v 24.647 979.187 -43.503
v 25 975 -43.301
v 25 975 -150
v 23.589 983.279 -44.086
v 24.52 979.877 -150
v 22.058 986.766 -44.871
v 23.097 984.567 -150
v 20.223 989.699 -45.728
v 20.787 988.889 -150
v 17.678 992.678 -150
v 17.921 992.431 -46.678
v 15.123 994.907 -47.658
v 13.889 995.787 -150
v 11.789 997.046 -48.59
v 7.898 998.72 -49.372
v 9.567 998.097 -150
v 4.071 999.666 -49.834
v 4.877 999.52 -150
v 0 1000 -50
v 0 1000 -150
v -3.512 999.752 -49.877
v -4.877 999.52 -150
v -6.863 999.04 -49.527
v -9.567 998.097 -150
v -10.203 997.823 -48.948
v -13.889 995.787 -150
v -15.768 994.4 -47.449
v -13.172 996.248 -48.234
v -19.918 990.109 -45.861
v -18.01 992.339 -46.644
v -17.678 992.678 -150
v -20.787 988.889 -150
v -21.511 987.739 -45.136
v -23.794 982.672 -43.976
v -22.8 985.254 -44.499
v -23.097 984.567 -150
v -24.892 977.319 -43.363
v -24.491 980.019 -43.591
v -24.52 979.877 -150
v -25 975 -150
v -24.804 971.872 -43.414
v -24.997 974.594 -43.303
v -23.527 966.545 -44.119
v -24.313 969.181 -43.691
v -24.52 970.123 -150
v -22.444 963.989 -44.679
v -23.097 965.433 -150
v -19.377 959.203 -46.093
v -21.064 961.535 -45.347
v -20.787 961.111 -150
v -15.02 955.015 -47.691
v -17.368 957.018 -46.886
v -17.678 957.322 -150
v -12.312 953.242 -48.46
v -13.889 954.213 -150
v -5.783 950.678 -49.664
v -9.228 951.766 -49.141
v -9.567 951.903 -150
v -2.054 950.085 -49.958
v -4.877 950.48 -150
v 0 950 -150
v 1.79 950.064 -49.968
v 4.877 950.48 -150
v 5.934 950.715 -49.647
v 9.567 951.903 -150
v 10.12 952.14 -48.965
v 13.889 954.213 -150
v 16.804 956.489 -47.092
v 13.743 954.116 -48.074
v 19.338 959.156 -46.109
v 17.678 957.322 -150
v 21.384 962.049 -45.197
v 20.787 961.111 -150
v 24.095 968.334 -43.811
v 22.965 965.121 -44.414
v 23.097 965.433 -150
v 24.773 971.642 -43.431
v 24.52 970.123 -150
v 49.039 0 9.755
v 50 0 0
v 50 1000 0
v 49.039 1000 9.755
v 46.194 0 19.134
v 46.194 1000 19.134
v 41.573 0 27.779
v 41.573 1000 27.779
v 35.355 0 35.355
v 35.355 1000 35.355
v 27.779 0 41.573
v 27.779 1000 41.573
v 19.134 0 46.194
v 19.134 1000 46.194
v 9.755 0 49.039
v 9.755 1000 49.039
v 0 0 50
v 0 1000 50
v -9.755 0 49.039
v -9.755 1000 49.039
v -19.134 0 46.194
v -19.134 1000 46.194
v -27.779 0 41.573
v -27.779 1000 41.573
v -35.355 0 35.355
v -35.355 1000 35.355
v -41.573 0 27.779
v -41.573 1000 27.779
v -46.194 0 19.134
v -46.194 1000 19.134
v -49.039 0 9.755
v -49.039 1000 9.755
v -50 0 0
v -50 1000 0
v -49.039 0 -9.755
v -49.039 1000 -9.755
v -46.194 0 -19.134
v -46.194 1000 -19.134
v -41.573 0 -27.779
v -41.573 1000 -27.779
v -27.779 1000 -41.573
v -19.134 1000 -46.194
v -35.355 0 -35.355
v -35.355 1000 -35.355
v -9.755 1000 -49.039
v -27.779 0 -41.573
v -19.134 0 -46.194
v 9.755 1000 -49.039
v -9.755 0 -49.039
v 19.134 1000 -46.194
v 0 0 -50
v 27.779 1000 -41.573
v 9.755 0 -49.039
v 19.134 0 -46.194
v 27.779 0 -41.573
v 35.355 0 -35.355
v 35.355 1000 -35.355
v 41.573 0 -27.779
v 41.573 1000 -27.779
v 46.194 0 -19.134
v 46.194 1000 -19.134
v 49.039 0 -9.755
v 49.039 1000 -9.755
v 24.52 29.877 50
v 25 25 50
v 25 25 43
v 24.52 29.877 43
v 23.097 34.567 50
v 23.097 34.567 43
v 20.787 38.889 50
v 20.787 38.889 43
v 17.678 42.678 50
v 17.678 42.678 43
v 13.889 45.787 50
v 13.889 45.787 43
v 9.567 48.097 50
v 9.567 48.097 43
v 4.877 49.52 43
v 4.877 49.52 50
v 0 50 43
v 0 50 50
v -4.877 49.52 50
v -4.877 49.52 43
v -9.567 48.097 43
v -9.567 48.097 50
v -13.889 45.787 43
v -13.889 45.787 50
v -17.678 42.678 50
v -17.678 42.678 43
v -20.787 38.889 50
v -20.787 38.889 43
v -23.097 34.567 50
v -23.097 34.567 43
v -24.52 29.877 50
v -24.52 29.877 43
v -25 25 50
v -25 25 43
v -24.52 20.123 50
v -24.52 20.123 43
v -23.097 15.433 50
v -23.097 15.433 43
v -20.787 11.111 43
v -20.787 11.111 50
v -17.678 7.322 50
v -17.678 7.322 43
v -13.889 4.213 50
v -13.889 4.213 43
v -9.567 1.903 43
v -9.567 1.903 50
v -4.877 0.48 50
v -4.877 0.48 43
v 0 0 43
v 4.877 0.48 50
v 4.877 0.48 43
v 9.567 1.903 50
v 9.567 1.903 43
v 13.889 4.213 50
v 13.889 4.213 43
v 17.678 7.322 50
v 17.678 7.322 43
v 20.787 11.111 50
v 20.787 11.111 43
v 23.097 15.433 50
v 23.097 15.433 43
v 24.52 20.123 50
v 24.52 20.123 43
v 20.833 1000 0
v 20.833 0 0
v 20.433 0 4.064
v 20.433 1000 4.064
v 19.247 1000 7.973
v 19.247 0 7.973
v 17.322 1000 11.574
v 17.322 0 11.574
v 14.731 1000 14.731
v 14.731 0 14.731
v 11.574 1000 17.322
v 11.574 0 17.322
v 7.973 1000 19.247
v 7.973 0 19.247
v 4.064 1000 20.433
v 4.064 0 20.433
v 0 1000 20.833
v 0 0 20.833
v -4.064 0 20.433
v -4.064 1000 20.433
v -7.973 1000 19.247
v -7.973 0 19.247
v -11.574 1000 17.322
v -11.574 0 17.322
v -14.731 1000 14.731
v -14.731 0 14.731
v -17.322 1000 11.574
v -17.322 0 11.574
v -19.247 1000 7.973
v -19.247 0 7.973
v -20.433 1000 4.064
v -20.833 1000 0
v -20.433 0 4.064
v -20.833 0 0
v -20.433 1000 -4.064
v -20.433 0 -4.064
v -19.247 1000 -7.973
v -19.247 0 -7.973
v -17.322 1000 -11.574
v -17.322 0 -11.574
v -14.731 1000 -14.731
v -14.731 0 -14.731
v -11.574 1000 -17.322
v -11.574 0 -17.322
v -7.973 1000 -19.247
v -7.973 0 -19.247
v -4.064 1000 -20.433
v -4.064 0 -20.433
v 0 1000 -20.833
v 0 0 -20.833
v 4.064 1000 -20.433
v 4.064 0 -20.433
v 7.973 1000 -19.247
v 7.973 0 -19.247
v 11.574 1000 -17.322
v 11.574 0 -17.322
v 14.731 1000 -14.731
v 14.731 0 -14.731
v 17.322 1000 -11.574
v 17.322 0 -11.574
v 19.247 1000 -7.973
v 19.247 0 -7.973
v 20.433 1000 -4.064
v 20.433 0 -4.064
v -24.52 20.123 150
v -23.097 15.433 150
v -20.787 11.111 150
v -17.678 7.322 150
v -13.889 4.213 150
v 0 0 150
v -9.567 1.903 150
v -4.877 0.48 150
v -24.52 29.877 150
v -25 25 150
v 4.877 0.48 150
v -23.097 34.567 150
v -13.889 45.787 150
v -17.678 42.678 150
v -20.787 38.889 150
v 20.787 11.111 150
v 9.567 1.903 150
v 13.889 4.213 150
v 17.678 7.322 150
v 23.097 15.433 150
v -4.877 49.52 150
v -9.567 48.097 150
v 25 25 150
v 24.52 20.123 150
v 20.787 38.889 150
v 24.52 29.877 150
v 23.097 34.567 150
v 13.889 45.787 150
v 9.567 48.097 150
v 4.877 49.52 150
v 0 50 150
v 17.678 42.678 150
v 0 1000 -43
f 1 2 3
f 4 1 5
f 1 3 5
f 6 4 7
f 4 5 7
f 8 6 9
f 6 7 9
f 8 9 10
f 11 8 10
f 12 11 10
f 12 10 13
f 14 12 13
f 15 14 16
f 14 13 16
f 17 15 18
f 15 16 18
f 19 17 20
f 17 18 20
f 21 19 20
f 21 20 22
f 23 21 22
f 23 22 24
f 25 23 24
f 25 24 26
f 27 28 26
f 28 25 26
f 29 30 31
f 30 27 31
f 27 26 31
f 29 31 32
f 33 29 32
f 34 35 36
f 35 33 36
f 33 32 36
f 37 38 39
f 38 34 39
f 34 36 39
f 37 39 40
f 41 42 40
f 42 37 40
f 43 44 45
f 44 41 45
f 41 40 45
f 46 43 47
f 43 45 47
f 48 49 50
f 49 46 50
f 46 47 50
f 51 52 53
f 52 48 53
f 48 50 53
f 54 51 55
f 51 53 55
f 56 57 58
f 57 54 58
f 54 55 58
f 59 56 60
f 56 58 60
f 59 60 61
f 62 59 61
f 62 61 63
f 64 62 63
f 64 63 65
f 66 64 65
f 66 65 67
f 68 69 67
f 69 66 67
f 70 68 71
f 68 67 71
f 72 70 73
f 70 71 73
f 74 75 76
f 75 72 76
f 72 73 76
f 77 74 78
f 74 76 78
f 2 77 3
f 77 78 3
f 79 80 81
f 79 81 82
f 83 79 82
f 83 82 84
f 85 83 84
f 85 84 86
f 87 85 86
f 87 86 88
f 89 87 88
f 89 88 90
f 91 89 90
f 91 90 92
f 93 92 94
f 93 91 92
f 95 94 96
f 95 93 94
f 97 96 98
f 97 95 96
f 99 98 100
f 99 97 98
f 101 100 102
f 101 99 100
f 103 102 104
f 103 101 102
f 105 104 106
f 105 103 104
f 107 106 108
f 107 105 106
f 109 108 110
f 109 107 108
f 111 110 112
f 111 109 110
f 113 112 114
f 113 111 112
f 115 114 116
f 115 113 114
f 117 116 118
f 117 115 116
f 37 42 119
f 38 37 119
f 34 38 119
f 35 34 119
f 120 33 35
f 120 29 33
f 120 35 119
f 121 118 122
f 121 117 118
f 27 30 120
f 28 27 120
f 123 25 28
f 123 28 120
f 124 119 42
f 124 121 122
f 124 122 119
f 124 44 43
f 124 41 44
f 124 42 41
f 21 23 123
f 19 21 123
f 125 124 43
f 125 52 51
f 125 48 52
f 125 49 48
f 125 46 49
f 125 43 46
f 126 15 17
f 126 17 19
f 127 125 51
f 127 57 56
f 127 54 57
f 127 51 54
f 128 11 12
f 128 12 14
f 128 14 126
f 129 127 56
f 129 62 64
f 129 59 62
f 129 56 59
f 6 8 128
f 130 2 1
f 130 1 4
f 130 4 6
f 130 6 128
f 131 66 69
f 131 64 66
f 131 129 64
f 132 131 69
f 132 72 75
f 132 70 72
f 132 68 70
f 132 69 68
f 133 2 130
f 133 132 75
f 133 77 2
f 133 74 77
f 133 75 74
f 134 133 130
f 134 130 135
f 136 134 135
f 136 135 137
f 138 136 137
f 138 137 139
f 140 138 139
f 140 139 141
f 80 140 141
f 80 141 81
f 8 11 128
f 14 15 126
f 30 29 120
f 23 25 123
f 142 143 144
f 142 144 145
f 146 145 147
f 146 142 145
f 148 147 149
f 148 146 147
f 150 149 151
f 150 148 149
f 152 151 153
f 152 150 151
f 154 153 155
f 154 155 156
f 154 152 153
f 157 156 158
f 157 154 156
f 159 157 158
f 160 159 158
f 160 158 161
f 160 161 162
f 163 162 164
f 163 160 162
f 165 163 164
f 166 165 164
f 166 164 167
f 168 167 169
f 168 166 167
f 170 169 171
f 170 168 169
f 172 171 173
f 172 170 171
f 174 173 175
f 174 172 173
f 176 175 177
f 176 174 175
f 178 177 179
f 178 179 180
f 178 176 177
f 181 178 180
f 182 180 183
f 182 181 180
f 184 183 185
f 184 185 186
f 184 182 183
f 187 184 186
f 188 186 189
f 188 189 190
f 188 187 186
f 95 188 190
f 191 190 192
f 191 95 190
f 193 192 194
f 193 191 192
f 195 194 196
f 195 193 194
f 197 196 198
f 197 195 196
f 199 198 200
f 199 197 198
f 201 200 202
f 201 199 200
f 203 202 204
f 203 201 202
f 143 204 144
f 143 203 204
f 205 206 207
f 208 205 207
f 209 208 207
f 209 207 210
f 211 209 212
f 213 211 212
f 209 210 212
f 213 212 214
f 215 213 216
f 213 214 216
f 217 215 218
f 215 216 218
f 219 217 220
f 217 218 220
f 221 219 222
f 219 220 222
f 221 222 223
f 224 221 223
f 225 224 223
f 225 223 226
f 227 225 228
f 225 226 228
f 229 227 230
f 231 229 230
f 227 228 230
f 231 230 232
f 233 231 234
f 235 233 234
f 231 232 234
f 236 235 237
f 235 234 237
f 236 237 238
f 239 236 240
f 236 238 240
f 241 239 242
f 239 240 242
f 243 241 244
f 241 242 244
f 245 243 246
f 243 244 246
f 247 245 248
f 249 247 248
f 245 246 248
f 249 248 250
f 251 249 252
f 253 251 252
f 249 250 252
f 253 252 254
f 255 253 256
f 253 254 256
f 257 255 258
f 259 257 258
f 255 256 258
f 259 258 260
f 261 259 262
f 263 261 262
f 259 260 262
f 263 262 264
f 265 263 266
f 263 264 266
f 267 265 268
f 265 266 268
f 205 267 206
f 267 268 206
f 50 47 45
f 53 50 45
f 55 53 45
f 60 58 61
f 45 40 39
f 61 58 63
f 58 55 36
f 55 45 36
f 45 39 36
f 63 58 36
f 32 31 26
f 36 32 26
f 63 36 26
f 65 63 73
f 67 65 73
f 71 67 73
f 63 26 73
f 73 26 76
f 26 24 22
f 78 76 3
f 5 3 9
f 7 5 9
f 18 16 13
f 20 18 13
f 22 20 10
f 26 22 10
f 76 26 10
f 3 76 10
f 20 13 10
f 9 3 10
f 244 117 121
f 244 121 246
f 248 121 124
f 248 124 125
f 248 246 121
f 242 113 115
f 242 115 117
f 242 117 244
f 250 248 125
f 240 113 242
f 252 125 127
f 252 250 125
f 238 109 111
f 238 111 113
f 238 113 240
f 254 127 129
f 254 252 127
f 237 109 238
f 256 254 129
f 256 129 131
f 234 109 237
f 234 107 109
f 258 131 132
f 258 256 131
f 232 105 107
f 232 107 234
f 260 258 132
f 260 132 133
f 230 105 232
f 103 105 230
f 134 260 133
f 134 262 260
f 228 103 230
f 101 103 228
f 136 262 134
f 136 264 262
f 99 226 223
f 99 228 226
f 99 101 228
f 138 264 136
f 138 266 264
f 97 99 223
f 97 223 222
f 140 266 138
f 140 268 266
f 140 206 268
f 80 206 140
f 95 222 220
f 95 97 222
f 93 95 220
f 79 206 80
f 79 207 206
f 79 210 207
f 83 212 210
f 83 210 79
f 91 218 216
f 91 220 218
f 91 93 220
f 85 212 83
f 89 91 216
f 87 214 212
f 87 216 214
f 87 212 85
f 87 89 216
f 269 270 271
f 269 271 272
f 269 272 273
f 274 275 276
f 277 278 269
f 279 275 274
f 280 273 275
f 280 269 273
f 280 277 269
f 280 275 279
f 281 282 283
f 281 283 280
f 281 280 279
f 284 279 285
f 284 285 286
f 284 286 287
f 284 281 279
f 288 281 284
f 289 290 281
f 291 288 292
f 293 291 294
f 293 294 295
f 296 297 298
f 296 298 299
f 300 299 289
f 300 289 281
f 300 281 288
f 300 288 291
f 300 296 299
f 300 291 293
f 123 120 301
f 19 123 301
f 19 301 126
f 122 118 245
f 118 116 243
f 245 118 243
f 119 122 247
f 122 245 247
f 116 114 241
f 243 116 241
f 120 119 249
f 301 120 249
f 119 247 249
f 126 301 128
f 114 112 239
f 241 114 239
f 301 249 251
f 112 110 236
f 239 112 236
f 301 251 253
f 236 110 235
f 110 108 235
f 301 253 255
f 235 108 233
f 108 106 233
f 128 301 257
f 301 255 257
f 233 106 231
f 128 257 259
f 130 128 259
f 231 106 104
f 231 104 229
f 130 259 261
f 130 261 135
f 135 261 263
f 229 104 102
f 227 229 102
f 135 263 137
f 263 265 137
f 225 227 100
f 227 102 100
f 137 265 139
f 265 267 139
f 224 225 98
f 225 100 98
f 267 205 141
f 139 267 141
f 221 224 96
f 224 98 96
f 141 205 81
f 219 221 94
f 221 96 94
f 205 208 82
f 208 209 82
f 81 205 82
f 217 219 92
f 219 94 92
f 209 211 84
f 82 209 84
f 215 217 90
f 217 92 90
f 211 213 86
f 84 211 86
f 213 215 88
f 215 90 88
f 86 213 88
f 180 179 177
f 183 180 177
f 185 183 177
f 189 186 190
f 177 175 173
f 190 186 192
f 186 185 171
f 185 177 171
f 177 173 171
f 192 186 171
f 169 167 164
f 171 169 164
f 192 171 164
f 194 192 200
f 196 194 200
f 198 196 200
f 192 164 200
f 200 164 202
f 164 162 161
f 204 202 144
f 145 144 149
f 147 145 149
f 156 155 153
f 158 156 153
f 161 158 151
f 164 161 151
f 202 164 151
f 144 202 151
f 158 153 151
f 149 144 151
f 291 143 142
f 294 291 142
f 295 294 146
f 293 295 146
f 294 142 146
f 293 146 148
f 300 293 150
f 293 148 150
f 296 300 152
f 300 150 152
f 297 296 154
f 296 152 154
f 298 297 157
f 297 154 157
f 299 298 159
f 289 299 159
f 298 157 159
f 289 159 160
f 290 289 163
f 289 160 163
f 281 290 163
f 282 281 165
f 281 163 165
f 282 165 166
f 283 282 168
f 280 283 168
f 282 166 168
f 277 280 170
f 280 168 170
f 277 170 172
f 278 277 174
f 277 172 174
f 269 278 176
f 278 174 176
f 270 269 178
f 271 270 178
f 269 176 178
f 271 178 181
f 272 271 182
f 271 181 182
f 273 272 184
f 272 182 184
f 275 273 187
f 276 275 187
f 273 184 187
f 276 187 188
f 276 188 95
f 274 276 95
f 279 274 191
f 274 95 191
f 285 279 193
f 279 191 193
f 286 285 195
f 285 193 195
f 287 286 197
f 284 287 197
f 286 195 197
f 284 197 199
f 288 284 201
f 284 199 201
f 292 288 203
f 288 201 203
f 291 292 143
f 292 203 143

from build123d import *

# Parameters (mm, degrees)
F0_R          = 50
F0_R_2        = 20.8333333333
F1_DEPTH      = 1000
F5_R          = 25
F6_DEPTH      = 100
F6_DEPTH_BACK = 7
F3_R          = 25
F7_DEPTH      = 7
F7_DEPTH_BACK = 100


# Not quite as in the source:
# - a feature names something its author has since deleted; it is built from what else it names


with BuildPart() as f1:
    # F0 (on Front) → F1 (new body)
    with BuildSketch(Plane.XZ):
        Circle(F0_R)
        Circle(F0_R_2, mode=Mode.SUBTRACT)
    extrude(amount=-F1_DEPTH)

    # F5 (on offset) → F6 (join, two sides)
    with BuildSketch(Plane.XY.offset(-50)) as f6_sk:
        with Locations((0, 975)):
            Circle(F5_R)
    extrude(amount=-F6_DEPTH)
    extrude(f6_sk.sketch, amount=F6_DEPTH_BACK)


with BuildPart() as f7:
    # F3 (on offset) → F7 (new body, two sides)
    with BuildSketch(Plane.XY.offset(50)) as f7_sk:
        with Locations((0, 25)):
            Circle(F3_R)
    extrude(amount=-F7_DEPTH)
    extrude(f7_sk.sketch, amount=F7_DEPTH_BACK)


solid = Compound([f1.part, f7.part])
